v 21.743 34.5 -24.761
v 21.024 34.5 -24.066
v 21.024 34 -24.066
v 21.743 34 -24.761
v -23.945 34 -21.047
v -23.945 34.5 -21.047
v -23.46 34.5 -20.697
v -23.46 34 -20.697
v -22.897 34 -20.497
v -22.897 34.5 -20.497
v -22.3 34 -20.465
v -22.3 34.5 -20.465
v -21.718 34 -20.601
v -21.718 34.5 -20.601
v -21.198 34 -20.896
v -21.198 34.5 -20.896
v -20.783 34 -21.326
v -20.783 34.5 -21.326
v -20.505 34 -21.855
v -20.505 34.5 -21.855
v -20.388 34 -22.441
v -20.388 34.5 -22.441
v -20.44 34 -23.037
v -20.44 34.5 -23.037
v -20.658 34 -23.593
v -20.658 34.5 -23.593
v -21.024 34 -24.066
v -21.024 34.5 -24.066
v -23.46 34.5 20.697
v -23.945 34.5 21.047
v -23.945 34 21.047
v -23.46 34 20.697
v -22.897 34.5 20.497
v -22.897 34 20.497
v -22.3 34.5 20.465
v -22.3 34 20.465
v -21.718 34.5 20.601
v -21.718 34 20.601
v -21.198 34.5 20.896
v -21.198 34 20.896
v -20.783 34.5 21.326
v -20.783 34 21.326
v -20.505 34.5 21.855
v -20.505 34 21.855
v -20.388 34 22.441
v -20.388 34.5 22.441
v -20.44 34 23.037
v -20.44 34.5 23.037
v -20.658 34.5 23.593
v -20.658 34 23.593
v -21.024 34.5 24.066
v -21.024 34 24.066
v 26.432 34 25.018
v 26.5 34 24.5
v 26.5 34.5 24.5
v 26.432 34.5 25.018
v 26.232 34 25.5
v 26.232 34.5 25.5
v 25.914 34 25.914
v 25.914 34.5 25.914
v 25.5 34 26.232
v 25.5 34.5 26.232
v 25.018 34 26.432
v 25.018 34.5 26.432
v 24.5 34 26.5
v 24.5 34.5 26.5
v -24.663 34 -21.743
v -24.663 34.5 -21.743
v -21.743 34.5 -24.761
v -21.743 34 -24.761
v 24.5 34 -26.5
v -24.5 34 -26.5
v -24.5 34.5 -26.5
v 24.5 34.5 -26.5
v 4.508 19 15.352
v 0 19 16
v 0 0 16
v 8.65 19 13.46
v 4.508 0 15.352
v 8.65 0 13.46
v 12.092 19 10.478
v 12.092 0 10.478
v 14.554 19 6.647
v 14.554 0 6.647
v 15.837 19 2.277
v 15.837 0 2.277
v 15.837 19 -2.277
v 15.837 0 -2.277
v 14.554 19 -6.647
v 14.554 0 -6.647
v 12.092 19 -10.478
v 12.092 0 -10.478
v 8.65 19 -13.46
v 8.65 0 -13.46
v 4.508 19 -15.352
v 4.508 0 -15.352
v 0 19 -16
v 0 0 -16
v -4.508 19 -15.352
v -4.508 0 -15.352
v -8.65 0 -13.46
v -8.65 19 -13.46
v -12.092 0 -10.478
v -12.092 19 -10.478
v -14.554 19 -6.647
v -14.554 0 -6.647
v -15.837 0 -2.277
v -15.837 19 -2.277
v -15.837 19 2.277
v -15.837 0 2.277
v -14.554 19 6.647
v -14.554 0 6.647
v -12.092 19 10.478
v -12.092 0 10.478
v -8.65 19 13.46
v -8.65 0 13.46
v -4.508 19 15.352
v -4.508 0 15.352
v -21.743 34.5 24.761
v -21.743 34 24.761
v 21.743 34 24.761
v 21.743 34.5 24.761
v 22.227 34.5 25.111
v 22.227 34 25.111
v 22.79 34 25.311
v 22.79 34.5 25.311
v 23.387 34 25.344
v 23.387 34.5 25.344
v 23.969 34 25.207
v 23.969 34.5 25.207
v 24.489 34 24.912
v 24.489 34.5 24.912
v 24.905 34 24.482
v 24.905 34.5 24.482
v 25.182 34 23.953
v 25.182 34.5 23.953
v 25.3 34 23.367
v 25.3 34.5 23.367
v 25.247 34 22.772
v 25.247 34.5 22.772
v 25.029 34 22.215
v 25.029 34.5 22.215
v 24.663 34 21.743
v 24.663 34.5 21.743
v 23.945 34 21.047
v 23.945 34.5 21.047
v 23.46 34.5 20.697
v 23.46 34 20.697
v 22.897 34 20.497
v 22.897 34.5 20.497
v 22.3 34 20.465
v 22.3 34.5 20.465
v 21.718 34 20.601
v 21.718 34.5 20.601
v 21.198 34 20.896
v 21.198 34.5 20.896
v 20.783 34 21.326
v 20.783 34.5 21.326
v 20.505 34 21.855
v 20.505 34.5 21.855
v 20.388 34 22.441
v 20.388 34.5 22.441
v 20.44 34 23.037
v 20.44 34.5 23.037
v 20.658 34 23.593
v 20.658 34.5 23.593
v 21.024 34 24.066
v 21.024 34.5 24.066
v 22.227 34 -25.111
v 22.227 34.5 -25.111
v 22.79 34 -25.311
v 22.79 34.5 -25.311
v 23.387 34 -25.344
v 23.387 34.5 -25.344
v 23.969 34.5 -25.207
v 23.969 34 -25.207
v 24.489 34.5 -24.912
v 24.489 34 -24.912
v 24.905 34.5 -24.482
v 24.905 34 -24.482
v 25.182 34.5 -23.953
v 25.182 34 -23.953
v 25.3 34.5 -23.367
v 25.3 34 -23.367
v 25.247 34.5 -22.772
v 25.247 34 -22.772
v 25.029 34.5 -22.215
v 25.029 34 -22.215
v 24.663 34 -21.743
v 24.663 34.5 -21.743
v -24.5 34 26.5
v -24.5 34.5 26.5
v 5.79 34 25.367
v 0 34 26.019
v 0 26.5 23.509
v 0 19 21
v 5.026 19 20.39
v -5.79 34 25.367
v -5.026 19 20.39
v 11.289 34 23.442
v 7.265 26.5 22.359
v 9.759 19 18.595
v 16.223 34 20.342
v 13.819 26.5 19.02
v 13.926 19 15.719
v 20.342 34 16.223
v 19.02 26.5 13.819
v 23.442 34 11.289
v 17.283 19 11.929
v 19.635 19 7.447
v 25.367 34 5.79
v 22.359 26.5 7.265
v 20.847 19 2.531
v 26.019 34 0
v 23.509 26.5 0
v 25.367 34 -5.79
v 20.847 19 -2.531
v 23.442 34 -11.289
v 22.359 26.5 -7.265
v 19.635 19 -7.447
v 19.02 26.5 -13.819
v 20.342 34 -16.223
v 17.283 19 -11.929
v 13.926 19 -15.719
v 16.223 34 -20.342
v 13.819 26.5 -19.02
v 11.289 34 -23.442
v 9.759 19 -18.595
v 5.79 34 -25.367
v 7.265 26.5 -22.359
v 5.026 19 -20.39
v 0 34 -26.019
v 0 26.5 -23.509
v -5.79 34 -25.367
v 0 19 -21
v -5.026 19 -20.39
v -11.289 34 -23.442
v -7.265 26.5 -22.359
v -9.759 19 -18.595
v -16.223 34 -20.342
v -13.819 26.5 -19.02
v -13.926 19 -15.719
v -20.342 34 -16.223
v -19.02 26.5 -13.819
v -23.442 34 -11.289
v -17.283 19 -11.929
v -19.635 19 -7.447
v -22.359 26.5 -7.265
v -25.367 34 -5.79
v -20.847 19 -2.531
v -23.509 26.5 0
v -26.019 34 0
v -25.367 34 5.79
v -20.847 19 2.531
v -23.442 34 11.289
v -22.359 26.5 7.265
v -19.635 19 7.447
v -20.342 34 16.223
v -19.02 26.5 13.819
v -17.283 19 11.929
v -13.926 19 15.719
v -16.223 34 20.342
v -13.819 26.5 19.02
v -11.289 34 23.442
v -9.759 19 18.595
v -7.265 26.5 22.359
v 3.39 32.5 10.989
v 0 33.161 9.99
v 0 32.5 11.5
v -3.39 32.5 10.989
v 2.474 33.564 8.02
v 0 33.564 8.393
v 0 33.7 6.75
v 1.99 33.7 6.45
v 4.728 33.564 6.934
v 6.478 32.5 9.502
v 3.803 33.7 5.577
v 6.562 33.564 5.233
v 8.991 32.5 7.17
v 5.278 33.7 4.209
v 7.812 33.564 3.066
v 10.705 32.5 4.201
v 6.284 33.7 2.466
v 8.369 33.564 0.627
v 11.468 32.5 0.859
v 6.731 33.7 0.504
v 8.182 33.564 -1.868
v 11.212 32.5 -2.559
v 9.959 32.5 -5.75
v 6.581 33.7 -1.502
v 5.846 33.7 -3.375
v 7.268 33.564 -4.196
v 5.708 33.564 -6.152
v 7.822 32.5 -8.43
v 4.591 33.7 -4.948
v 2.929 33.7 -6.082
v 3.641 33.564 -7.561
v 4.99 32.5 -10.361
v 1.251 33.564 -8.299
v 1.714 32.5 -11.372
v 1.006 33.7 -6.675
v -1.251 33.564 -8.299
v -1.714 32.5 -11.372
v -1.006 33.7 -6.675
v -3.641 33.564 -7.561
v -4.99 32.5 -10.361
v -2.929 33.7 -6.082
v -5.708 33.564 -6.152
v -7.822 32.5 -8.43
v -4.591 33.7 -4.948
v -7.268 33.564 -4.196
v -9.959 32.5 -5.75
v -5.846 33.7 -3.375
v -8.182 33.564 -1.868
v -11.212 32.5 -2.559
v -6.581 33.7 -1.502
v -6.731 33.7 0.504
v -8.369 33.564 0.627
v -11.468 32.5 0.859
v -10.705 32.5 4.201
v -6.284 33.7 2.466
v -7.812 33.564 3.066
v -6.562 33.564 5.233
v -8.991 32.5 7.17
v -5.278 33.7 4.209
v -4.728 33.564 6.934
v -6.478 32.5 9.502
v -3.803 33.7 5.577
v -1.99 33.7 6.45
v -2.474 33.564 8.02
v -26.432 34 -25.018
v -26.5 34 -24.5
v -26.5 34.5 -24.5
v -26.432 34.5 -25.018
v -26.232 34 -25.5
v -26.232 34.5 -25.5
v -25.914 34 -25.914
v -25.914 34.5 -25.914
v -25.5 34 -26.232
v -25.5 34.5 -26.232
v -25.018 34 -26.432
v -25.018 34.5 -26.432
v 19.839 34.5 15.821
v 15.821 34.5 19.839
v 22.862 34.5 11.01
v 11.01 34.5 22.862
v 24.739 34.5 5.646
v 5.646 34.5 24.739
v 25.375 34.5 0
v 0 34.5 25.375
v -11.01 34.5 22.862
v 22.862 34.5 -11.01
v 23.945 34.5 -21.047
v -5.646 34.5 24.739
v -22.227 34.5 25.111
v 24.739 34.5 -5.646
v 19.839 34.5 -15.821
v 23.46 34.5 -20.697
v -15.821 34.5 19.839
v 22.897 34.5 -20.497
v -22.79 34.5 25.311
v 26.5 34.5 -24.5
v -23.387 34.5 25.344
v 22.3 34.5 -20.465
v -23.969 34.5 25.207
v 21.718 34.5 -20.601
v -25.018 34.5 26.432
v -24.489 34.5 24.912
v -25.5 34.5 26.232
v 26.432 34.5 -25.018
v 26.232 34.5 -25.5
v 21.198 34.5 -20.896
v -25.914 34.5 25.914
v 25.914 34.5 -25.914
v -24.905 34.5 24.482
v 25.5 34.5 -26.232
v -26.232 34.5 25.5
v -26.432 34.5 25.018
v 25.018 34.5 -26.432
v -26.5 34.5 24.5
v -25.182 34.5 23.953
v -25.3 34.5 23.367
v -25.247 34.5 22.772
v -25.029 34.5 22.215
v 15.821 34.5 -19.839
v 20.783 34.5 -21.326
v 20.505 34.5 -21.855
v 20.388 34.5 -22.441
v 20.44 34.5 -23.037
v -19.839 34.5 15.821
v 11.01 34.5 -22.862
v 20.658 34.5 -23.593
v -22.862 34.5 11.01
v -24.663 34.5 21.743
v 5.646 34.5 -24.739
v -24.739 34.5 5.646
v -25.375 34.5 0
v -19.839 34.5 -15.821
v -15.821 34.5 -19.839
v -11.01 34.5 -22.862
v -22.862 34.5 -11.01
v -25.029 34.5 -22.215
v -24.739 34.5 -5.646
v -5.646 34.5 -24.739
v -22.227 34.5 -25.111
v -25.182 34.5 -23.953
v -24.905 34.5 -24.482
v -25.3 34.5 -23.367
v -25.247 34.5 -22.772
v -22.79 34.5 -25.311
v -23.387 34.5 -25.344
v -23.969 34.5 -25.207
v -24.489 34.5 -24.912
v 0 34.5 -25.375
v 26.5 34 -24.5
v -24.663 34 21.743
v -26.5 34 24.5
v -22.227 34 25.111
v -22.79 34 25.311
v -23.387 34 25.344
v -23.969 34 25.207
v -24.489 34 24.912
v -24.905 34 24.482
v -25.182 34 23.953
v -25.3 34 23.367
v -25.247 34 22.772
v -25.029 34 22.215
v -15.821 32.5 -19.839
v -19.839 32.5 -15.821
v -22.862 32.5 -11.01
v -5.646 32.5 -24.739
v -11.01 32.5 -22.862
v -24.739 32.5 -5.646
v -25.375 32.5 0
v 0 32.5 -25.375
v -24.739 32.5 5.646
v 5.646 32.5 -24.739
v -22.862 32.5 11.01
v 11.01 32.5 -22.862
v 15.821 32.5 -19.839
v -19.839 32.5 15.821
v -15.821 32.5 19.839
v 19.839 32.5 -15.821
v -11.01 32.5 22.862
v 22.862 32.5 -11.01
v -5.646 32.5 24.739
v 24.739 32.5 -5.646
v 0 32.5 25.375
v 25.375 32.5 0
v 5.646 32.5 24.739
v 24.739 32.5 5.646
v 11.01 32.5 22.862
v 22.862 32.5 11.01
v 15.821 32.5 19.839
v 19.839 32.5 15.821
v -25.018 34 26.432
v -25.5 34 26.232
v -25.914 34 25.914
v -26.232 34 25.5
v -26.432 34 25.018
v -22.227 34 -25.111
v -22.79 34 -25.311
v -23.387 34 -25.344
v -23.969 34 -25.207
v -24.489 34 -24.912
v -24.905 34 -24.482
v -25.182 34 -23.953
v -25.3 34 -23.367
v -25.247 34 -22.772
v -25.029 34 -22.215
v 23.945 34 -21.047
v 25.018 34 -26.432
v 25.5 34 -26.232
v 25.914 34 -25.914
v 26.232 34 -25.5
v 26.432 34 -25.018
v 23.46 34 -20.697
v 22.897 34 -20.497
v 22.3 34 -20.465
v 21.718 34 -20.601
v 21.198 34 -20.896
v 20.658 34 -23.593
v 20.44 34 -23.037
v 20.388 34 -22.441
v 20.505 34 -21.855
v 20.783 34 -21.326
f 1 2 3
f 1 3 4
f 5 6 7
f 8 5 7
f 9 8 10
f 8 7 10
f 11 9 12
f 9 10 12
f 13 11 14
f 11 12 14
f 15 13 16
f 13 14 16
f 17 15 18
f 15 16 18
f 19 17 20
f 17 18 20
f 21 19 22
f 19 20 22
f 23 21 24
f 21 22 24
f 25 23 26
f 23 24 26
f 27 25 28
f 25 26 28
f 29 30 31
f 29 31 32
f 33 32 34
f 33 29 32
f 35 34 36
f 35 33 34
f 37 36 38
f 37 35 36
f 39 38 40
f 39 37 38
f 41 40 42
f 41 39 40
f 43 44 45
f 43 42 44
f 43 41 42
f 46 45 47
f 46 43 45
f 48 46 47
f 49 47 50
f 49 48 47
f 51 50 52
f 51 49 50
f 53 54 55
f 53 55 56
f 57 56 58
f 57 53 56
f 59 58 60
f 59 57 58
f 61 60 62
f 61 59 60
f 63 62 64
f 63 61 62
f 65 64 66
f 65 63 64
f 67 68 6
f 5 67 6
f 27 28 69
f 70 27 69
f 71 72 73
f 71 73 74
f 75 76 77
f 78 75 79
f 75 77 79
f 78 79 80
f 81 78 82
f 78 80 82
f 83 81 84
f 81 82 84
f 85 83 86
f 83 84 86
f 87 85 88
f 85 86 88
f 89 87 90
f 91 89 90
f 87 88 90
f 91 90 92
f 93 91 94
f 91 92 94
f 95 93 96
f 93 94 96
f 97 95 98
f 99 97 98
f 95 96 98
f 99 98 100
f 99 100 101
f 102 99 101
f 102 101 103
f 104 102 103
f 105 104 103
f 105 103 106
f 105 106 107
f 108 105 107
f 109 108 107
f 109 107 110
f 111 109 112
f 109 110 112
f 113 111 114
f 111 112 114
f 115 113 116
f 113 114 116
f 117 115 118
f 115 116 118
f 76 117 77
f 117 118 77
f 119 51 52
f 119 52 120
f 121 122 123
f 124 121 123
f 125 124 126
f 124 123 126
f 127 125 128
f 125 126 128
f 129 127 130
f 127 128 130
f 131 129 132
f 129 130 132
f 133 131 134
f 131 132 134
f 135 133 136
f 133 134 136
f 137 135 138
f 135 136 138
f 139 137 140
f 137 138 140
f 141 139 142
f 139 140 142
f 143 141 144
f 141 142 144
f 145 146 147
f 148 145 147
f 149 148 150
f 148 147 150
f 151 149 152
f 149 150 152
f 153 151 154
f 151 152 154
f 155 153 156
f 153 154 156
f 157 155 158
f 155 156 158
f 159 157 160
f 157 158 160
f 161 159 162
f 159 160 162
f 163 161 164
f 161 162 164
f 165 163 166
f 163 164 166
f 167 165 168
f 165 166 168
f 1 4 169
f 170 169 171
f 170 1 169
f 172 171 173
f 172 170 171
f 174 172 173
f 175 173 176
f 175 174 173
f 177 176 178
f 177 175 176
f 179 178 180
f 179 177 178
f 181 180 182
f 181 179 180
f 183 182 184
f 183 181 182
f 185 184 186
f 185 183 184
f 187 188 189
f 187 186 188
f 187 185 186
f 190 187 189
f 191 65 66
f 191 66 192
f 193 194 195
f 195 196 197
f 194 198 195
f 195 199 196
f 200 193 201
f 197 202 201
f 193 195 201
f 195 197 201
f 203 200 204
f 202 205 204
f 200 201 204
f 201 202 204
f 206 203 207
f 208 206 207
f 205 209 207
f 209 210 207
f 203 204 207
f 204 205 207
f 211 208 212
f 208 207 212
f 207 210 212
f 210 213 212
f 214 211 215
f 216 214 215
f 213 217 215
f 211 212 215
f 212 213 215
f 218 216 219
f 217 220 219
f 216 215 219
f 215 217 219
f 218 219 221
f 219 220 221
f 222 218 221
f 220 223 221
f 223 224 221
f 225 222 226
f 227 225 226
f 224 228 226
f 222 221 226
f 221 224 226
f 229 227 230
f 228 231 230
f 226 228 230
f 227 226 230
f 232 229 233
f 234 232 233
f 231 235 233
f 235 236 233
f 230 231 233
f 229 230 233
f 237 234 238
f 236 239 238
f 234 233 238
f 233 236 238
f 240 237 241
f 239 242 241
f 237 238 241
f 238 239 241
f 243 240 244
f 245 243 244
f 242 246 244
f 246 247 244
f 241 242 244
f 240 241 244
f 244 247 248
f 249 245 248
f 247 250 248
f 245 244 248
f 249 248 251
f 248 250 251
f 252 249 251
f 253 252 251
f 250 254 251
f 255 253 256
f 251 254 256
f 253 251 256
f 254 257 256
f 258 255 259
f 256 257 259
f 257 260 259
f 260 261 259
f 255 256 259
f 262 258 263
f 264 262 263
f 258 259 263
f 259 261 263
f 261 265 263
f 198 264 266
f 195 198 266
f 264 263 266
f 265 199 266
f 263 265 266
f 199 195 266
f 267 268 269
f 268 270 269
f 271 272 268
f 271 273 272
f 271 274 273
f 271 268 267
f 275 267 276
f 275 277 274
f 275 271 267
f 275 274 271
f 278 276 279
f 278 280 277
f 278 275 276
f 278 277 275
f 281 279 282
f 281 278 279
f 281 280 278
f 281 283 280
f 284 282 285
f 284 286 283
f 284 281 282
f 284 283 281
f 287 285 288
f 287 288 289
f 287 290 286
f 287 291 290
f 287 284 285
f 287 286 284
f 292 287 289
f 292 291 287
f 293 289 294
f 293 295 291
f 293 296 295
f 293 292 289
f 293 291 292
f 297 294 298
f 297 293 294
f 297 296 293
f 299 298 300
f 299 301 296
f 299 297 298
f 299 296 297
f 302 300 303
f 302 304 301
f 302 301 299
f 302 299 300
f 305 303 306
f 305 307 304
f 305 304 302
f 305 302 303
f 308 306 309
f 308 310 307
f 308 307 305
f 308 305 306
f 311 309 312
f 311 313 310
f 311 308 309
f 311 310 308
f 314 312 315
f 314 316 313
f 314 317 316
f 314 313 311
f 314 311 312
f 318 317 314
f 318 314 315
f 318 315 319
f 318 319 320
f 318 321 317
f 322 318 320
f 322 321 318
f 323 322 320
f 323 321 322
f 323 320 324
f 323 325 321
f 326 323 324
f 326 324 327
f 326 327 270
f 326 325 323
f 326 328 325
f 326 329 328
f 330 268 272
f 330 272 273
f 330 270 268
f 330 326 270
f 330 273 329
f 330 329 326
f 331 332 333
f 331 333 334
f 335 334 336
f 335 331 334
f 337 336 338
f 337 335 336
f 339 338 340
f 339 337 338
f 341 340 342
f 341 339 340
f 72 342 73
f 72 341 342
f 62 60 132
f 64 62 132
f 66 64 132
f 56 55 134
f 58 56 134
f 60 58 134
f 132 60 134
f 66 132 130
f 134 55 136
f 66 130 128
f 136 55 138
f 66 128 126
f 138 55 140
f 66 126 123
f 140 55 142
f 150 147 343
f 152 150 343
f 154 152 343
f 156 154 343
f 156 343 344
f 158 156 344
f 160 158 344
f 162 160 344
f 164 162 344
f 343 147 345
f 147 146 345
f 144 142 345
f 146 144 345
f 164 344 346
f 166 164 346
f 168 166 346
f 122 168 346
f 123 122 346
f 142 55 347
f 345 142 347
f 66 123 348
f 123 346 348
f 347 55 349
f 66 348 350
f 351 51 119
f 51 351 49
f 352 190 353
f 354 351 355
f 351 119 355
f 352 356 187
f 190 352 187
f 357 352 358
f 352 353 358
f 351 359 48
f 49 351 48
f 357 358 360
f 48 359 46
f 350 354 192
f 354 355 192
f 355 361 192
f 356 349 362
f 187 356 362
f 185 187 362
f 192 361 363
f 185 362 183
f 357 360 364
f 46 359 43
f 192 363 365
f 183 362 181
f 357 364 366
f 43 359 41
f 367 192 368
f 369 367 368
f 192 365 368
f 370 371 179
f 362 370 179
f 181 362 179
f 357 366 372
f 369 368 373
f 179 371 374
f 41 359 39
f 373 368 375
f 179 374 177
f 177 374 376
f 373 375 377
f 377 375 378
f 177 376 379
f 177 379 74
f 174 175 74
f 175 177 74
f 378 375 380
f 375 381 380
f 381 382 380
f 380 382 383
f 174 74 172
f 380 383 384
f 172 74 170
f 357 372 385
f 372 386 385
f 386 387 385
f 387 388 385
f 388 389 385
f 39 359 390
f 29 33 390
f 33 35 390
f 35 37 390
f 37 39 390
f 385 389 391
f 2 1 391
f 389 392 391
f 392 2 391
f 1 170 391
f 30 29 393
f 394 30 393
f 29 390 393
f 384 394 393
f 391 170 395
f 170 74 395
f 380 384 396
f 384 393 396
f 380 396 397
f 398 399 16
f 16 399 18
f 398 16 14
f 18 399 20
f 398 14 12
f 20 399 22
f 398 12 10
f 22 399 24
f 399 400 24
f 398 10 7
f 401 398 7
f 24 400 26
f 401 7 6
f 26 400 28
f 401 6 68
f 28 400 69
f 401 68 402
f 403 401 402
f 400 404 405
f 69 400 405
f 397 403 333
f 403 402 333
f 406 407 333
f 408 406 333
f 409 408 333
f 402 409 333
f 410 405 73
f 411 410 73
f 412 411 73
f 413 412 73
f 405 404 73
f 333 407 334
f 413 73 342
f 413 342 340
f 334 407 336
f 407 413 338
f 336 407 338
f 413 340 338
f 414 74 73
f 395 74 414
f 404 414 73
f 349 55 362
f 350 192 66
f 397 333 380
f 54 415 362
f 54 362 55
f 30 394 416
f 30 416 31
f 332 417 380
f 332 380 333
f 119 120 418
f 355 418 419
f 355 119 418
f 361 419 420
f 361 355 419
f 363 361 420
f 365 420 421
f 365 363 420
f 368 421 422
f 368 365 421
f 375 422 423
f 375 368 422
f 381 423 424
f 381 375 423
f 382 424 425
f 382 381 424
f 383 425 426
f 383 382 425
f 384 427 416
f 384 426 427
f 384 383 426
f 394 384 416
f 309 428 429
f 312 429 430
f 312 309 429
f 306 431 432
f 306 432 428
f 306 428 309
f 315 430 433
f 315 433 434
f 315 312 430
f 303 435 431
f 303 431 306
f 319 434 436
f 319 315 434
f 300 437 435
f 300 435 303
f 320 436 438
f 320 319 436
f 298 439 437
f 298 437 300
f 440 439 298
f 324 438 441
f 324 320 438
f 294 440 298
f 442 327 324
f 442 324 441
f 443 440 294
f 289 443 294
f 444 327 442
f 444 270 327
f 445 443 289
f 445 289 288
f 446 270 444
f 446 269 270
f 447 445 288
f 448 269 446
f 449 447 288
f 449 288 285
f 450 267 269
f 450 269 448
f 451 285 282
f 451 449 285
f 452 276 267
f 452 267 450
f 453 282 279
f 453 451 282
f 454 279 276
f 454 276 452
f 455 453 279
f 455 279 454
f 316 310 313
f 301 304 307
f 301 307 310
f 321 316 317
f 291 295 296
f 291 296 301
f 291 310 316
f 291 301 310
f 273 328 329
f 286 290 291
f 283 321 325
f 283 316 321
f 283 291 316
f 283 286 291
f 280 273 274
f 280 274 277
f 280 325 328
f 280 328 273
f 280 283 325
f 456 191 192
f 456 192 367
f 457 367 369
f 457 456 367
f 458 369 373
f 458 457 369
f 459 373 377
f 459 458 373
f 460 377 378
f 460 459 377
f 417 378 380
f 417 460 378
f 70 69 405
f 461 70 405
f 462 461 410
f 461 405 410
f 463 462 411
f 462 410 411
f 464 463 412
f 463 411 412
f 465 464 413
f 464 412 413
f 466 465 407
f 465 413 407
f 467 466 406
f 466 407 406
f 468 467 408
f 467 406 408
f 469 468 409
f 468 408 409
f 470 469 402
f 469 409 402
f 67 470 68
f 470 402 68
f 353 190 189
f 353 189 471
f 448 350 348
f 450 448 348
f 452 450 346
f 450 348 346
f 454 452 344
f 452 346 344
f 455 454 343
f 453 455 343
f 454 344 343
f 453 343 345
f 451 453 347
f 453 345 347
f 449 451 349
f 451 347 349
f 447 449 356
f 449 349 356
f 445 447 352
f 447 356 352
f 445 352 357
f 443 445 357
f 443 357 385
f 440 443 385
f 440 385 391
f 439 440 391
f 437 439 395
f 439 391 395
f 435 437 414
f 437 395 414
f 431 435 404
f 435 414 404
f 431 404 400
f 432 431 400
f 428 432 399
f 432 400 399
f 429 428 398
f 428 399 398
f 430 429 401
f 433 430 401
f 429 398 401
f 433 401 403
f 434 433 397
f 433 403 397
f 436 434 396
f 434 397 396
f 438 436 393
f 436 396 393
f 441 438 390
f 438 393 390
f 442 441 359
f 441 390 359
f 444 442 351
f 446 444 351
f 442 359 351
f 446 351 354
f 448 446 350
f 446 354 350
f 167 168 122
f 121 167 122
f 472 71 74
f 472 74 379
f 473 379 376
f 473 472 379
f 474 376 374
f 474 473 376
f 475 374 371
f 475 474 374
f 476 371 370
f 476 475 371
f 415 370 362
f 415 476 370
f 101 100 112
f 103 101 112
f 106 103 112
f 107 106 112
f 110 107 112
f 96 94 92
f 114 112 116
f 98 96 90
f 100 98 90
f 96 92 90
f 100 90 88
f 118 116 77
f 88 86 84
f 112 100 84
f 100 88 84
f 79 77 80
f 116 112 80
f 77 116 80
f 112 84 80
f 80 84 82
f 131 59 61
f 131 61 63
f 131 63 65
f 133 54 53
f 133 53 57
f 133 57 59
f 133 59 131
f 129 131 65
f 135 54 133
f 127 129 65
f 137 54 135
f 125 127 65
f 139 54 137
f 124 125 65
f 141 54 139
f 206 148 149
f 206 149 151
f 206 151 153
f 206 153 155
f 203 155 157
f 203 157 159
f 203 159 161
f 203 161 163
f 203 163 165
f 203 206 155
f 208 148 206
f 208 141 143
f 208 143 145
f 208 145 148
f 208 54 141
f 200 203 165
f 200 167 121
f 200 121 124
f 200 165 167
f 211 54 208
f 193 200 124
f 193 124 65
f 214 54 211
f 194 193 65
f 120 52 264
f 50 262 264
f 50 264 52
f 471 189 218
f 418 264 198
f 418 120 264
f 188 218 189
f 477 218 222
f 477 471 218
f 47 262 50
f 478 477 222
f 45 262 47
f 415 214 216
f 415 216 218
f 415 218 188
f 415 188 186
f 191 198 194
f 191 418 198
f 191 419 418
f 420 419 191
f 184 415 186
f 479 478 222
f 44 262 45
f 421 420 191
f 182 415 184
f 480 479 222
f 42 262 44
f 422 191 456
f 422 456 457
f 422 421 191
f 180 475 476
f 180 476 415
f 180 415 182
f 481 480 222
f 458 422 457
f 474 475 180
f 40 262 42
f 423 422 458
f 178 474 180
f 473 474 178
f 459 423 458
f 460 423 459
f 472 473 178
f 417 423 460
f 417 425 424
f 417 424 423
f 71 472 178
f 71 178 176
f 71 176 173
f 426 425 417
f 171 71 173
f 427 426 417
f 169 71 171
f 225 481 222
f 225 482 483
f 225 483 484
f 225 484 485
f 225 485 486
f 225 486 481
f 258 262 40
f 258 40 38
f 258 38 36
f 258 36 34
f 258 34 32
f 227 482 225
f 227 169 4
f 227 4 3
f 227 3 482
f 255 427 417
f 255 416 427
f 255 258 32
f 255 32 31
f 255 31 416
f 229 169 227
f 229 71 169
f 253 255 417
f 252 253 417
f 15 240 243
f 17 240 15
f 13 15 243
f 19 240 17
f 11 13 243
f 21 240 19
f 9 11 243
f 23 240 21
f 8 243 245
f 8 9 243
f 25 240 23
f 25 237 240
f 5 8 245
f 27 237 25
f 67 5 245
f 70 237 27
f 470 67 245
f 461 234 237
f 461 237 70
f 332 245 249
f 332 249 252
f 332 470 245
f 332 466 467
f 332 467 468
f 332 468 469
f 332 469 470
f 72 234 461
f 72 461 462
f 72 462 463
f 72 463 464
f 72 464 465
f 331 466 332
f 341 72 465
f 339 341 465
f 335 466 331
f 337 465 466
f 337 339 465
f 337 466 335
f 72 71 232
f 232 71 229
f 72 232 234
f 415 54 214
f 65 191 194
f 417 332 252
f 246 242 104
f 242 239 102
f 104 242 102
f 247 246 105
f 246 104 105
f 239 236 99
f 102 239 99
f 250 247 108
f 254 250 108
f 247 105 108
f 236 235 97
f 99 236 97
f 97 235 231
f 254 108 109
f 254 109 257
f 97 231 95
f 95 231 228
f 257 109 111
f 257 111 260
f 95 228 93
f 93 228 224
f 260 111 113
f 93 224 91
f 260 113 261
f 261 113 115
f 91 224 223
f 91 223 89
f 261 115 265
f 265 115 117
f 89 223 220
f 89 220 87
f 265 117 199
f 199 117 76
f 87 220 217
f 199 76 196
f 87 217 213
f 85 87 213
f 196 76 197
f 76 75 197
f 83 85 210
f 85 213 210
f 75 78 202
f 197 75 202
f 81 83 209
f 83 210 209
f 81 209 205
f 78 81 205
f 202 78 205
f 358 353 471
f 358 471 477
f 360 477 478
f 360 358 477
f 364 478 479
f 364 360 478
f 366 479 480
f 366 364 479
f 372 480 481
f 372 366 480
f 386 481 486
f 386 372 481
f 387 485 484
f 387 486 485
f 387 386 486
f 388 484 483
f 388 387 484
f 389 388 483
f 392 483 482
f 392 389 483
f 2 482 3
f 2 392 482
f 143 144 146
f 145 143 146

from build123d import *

# Parameters (mm, degrees)
ESQUISSE2_R             = 16
BOSS_EXTRU_1_DEPTH      = 19
ESQUISSE3_R             = 21
BOSS_EXTRU_2_DEPTH      = 15
D_POUILLE1_ANGLE        = 18.5
BOSS_EXTRU_3_DEPTH      = 0.5
ESQUISSE5_R             = 25.375
ENL_V_MAT_EXTRU_1_DEPTH = 2
ESQUISSE6_R             = 11.5
BOSS_EXTRU_4_DEPTH      = 1.2
CONG_1_R                = 10
ENL_V_MAT_EXTRU_2_DEPTH = 10


with BuildPart() as part:
    # Esquisse2 → Boss.-Extru.1 (new body)
    with BuildSketch(Plane(origin=(0, 0, 0), x_dir=(1, 0, 0), z_dir=(0, 1, 0))):
        with Locations(Location((0, 0, 0), (0, 0, 270))):
            Circle(ESQUISSE2_R)
    extrude(amount=BOSS_EXTRU_1_DEPTH)

    # Esquisse3 → Boss.-Extru.2 (add)
    with BuildSketch(Plane(origin=(0, 19, 0), x_dir=(1, 0, 0), z_dir=(0, 1, 0))):
        with Locations(Location((0, 0, 0), (0, 0, 270))):
            Circle(ESQUISSE3_R)
    extrude(amount=BOSS_EXTRU_2_DEPTH)

    # Dépouille1
    d_pouille1_faces = [part.faces().sort_by_distance(p)[0] for p in [
        (0, 26.5, -21),
    ]]
    draft(d_pouille1_faces, Plane(origin=(0, 19, 0), x_dir=(0, 0, -1), z_dir=(0, -1, 0)), D_POUILLE1_ANGLE)

    # Esquisse4 → Boss.-Extru.3 (add)
    with BuildSketch(Plane(origin=(0, 34, 0), x_dir=(1, 0, 0), z_dir=(0, 1, 0))):
        with BuildLine():
            Line((-24.5, 26.5), (24.5, 26.5))
            ThreePointArc((24.5, 26.5), (25.914213562, 25.914213562), (26.5, 24.5))
            Line((26.5, 24.5), (26.5, -24.5))
            ThreePointArc((26.5, -24.5), (25.914213562, -25.914213562), (24.5, -26.5))
            Line((24.5, -26.5), (-24.5, -26.5))
            ThreePointArc((-24.5, -26.5), (-25.914213562, -25.914213562), (-26.5, -24.5))
            Line((-26.5, -24.5), (-26.5, 24.5))
            ThreePointArc((-26.5, 24.5), (-25.914213562, 25.914213562), (-24.5, 26.5))
        make_face()
    extrude(amount=BOSS_EXTRU_3_DEPTH)

    # Esquisse5 → Enlèv. mat.-Extru.1 (cut)
    with BuildSketch(Plane(origin=(0, 34.5, 0), x_dir=(1, 0, 0), z_dir=(0, 1, 0))):
        with Locations(Location((0, 0, 0), (0, 0, 270))):
            Circle(ESQUISSE5_R)
    extrude(amount=-ENL_V_MAT_EXTRU_1_DEPTH, mode=Mode.SUBTRACT)

    # Esquisse6 → Boss.-Extru.4 (add)
    with BuildSketch(Plane(origin=(0, 32.5, 0), x_dir=(1, 0, 0), z_dir=(0, 1, 0))):
        with Locations(Location((0, 0, 0), (0, 0, 270))):
            Circle(ESQUISSE6_R)
    extrude(amount=BOSS_EXTRU_4_DEPTH)

    # Congé1
    # the kernel refuses this fillet: 10 mm, written as the material it takes off along each edge
    with BuildSketch(Plane(origin=(0, 33.7, 0), x_dir=(0, 0, 1), z_dir=(-1, 0, 0))) as cong_1_piece_1:
        with BuildLine():
            CenterArc((6.750263165, -10), CONG_1_R, 61.642363424, 28.357636576)
            Line((6.750263165, 0), (6.750263165, 0.2))
            Line((6.750263165, 0.2), (11.5, 0.2))
            Line((11.5, 0.2), (11.7, 0))
            ThreePointArc((11.7, 0), (11.7, -0.6), (11.594994737, -1.024))
            Line((11.594994737, -1.024), (11.5, -1.2))
        make_face()
    revolve(axis=Axis((0, 33.7, 0), (0, 1, 0)), mode=Mode.SUBTRACT)

    # Esquisse7 → Enlèv. mat.-Extru.2 (cut)
    with BuildSketch(Plane(origin=(0, 34.5, 0), x_dir=(1, 0, 0), z_dir=(0, 1, 0))):
        with BuildLine():
            Line((21.024040871, 24.065615546), (21.74268552, 24.760993047))
            ThreePointArc((21.74268552, 24.760993047), (24.712132034, 24.712132034), (24.663271022, 21.74268552))
            Line((24.663271022, 21.74268552), (23.944626373, 21.04730802))
            ThreePointArc((23.944626373, 21.04730802), (20.975179858, 21.096169032), (21.024040871, 24.065615546))
        make_face()
        with BuildLine():
            Line((-21.024040871, 24.065615546), (-21.74268552, 24.760993047))
            ThreePointArc((-21.74268552, 24.760993047), (-24.712132034, 24.712132034), (-24.663271022, 21.74268552))
            Line((-24.663271022, 21.74268552), (-23.944626373, 21.04730802))
            ThreePointArc((-23.944626373, 21.04730802), (-20.975179858, 21.096169032), (-21.024040871, 24.065615546))
        make_face()
        with BuildLine():
            Line((21.024040871, -24.065615546), (21.74268552, -24.760993047))
            ThreePointArc((21.74268552, -24.760993047), (24.712132034, -24.712132034), (24.663271022, -21.74268552))
            Line((24.663271022, -21.74268552), (23.944626373, -21.04730802))
            ThreePointArc((23.944626373, -21.04730802), (20.975179858, -21.096169032), (21.024040871, -24.065615546))
        make_face()
        with BuildLine():
            Line((-21.024040871, -24.065615546), (-21.74268552, -24.760993047))
            ThreePointArc((-21.74268552, -24.760993047), (-24.712132034, -24.712132034), (-24.663271022, -21.74268552))
            Line((-24.663271022, -21.74268552), (-23.944626373, -21.04730802))
            ThreePointArc((-23.944626373, -21.04730802), (-20.975179858, -21.096169032), (-21.024040871, -24.065615546))
        make_face()
    extrude(amount=-ENL_V_MAT_EXTRU_2_DEPTH, mode=Mode.SUBTRACT)


solid = part.part
